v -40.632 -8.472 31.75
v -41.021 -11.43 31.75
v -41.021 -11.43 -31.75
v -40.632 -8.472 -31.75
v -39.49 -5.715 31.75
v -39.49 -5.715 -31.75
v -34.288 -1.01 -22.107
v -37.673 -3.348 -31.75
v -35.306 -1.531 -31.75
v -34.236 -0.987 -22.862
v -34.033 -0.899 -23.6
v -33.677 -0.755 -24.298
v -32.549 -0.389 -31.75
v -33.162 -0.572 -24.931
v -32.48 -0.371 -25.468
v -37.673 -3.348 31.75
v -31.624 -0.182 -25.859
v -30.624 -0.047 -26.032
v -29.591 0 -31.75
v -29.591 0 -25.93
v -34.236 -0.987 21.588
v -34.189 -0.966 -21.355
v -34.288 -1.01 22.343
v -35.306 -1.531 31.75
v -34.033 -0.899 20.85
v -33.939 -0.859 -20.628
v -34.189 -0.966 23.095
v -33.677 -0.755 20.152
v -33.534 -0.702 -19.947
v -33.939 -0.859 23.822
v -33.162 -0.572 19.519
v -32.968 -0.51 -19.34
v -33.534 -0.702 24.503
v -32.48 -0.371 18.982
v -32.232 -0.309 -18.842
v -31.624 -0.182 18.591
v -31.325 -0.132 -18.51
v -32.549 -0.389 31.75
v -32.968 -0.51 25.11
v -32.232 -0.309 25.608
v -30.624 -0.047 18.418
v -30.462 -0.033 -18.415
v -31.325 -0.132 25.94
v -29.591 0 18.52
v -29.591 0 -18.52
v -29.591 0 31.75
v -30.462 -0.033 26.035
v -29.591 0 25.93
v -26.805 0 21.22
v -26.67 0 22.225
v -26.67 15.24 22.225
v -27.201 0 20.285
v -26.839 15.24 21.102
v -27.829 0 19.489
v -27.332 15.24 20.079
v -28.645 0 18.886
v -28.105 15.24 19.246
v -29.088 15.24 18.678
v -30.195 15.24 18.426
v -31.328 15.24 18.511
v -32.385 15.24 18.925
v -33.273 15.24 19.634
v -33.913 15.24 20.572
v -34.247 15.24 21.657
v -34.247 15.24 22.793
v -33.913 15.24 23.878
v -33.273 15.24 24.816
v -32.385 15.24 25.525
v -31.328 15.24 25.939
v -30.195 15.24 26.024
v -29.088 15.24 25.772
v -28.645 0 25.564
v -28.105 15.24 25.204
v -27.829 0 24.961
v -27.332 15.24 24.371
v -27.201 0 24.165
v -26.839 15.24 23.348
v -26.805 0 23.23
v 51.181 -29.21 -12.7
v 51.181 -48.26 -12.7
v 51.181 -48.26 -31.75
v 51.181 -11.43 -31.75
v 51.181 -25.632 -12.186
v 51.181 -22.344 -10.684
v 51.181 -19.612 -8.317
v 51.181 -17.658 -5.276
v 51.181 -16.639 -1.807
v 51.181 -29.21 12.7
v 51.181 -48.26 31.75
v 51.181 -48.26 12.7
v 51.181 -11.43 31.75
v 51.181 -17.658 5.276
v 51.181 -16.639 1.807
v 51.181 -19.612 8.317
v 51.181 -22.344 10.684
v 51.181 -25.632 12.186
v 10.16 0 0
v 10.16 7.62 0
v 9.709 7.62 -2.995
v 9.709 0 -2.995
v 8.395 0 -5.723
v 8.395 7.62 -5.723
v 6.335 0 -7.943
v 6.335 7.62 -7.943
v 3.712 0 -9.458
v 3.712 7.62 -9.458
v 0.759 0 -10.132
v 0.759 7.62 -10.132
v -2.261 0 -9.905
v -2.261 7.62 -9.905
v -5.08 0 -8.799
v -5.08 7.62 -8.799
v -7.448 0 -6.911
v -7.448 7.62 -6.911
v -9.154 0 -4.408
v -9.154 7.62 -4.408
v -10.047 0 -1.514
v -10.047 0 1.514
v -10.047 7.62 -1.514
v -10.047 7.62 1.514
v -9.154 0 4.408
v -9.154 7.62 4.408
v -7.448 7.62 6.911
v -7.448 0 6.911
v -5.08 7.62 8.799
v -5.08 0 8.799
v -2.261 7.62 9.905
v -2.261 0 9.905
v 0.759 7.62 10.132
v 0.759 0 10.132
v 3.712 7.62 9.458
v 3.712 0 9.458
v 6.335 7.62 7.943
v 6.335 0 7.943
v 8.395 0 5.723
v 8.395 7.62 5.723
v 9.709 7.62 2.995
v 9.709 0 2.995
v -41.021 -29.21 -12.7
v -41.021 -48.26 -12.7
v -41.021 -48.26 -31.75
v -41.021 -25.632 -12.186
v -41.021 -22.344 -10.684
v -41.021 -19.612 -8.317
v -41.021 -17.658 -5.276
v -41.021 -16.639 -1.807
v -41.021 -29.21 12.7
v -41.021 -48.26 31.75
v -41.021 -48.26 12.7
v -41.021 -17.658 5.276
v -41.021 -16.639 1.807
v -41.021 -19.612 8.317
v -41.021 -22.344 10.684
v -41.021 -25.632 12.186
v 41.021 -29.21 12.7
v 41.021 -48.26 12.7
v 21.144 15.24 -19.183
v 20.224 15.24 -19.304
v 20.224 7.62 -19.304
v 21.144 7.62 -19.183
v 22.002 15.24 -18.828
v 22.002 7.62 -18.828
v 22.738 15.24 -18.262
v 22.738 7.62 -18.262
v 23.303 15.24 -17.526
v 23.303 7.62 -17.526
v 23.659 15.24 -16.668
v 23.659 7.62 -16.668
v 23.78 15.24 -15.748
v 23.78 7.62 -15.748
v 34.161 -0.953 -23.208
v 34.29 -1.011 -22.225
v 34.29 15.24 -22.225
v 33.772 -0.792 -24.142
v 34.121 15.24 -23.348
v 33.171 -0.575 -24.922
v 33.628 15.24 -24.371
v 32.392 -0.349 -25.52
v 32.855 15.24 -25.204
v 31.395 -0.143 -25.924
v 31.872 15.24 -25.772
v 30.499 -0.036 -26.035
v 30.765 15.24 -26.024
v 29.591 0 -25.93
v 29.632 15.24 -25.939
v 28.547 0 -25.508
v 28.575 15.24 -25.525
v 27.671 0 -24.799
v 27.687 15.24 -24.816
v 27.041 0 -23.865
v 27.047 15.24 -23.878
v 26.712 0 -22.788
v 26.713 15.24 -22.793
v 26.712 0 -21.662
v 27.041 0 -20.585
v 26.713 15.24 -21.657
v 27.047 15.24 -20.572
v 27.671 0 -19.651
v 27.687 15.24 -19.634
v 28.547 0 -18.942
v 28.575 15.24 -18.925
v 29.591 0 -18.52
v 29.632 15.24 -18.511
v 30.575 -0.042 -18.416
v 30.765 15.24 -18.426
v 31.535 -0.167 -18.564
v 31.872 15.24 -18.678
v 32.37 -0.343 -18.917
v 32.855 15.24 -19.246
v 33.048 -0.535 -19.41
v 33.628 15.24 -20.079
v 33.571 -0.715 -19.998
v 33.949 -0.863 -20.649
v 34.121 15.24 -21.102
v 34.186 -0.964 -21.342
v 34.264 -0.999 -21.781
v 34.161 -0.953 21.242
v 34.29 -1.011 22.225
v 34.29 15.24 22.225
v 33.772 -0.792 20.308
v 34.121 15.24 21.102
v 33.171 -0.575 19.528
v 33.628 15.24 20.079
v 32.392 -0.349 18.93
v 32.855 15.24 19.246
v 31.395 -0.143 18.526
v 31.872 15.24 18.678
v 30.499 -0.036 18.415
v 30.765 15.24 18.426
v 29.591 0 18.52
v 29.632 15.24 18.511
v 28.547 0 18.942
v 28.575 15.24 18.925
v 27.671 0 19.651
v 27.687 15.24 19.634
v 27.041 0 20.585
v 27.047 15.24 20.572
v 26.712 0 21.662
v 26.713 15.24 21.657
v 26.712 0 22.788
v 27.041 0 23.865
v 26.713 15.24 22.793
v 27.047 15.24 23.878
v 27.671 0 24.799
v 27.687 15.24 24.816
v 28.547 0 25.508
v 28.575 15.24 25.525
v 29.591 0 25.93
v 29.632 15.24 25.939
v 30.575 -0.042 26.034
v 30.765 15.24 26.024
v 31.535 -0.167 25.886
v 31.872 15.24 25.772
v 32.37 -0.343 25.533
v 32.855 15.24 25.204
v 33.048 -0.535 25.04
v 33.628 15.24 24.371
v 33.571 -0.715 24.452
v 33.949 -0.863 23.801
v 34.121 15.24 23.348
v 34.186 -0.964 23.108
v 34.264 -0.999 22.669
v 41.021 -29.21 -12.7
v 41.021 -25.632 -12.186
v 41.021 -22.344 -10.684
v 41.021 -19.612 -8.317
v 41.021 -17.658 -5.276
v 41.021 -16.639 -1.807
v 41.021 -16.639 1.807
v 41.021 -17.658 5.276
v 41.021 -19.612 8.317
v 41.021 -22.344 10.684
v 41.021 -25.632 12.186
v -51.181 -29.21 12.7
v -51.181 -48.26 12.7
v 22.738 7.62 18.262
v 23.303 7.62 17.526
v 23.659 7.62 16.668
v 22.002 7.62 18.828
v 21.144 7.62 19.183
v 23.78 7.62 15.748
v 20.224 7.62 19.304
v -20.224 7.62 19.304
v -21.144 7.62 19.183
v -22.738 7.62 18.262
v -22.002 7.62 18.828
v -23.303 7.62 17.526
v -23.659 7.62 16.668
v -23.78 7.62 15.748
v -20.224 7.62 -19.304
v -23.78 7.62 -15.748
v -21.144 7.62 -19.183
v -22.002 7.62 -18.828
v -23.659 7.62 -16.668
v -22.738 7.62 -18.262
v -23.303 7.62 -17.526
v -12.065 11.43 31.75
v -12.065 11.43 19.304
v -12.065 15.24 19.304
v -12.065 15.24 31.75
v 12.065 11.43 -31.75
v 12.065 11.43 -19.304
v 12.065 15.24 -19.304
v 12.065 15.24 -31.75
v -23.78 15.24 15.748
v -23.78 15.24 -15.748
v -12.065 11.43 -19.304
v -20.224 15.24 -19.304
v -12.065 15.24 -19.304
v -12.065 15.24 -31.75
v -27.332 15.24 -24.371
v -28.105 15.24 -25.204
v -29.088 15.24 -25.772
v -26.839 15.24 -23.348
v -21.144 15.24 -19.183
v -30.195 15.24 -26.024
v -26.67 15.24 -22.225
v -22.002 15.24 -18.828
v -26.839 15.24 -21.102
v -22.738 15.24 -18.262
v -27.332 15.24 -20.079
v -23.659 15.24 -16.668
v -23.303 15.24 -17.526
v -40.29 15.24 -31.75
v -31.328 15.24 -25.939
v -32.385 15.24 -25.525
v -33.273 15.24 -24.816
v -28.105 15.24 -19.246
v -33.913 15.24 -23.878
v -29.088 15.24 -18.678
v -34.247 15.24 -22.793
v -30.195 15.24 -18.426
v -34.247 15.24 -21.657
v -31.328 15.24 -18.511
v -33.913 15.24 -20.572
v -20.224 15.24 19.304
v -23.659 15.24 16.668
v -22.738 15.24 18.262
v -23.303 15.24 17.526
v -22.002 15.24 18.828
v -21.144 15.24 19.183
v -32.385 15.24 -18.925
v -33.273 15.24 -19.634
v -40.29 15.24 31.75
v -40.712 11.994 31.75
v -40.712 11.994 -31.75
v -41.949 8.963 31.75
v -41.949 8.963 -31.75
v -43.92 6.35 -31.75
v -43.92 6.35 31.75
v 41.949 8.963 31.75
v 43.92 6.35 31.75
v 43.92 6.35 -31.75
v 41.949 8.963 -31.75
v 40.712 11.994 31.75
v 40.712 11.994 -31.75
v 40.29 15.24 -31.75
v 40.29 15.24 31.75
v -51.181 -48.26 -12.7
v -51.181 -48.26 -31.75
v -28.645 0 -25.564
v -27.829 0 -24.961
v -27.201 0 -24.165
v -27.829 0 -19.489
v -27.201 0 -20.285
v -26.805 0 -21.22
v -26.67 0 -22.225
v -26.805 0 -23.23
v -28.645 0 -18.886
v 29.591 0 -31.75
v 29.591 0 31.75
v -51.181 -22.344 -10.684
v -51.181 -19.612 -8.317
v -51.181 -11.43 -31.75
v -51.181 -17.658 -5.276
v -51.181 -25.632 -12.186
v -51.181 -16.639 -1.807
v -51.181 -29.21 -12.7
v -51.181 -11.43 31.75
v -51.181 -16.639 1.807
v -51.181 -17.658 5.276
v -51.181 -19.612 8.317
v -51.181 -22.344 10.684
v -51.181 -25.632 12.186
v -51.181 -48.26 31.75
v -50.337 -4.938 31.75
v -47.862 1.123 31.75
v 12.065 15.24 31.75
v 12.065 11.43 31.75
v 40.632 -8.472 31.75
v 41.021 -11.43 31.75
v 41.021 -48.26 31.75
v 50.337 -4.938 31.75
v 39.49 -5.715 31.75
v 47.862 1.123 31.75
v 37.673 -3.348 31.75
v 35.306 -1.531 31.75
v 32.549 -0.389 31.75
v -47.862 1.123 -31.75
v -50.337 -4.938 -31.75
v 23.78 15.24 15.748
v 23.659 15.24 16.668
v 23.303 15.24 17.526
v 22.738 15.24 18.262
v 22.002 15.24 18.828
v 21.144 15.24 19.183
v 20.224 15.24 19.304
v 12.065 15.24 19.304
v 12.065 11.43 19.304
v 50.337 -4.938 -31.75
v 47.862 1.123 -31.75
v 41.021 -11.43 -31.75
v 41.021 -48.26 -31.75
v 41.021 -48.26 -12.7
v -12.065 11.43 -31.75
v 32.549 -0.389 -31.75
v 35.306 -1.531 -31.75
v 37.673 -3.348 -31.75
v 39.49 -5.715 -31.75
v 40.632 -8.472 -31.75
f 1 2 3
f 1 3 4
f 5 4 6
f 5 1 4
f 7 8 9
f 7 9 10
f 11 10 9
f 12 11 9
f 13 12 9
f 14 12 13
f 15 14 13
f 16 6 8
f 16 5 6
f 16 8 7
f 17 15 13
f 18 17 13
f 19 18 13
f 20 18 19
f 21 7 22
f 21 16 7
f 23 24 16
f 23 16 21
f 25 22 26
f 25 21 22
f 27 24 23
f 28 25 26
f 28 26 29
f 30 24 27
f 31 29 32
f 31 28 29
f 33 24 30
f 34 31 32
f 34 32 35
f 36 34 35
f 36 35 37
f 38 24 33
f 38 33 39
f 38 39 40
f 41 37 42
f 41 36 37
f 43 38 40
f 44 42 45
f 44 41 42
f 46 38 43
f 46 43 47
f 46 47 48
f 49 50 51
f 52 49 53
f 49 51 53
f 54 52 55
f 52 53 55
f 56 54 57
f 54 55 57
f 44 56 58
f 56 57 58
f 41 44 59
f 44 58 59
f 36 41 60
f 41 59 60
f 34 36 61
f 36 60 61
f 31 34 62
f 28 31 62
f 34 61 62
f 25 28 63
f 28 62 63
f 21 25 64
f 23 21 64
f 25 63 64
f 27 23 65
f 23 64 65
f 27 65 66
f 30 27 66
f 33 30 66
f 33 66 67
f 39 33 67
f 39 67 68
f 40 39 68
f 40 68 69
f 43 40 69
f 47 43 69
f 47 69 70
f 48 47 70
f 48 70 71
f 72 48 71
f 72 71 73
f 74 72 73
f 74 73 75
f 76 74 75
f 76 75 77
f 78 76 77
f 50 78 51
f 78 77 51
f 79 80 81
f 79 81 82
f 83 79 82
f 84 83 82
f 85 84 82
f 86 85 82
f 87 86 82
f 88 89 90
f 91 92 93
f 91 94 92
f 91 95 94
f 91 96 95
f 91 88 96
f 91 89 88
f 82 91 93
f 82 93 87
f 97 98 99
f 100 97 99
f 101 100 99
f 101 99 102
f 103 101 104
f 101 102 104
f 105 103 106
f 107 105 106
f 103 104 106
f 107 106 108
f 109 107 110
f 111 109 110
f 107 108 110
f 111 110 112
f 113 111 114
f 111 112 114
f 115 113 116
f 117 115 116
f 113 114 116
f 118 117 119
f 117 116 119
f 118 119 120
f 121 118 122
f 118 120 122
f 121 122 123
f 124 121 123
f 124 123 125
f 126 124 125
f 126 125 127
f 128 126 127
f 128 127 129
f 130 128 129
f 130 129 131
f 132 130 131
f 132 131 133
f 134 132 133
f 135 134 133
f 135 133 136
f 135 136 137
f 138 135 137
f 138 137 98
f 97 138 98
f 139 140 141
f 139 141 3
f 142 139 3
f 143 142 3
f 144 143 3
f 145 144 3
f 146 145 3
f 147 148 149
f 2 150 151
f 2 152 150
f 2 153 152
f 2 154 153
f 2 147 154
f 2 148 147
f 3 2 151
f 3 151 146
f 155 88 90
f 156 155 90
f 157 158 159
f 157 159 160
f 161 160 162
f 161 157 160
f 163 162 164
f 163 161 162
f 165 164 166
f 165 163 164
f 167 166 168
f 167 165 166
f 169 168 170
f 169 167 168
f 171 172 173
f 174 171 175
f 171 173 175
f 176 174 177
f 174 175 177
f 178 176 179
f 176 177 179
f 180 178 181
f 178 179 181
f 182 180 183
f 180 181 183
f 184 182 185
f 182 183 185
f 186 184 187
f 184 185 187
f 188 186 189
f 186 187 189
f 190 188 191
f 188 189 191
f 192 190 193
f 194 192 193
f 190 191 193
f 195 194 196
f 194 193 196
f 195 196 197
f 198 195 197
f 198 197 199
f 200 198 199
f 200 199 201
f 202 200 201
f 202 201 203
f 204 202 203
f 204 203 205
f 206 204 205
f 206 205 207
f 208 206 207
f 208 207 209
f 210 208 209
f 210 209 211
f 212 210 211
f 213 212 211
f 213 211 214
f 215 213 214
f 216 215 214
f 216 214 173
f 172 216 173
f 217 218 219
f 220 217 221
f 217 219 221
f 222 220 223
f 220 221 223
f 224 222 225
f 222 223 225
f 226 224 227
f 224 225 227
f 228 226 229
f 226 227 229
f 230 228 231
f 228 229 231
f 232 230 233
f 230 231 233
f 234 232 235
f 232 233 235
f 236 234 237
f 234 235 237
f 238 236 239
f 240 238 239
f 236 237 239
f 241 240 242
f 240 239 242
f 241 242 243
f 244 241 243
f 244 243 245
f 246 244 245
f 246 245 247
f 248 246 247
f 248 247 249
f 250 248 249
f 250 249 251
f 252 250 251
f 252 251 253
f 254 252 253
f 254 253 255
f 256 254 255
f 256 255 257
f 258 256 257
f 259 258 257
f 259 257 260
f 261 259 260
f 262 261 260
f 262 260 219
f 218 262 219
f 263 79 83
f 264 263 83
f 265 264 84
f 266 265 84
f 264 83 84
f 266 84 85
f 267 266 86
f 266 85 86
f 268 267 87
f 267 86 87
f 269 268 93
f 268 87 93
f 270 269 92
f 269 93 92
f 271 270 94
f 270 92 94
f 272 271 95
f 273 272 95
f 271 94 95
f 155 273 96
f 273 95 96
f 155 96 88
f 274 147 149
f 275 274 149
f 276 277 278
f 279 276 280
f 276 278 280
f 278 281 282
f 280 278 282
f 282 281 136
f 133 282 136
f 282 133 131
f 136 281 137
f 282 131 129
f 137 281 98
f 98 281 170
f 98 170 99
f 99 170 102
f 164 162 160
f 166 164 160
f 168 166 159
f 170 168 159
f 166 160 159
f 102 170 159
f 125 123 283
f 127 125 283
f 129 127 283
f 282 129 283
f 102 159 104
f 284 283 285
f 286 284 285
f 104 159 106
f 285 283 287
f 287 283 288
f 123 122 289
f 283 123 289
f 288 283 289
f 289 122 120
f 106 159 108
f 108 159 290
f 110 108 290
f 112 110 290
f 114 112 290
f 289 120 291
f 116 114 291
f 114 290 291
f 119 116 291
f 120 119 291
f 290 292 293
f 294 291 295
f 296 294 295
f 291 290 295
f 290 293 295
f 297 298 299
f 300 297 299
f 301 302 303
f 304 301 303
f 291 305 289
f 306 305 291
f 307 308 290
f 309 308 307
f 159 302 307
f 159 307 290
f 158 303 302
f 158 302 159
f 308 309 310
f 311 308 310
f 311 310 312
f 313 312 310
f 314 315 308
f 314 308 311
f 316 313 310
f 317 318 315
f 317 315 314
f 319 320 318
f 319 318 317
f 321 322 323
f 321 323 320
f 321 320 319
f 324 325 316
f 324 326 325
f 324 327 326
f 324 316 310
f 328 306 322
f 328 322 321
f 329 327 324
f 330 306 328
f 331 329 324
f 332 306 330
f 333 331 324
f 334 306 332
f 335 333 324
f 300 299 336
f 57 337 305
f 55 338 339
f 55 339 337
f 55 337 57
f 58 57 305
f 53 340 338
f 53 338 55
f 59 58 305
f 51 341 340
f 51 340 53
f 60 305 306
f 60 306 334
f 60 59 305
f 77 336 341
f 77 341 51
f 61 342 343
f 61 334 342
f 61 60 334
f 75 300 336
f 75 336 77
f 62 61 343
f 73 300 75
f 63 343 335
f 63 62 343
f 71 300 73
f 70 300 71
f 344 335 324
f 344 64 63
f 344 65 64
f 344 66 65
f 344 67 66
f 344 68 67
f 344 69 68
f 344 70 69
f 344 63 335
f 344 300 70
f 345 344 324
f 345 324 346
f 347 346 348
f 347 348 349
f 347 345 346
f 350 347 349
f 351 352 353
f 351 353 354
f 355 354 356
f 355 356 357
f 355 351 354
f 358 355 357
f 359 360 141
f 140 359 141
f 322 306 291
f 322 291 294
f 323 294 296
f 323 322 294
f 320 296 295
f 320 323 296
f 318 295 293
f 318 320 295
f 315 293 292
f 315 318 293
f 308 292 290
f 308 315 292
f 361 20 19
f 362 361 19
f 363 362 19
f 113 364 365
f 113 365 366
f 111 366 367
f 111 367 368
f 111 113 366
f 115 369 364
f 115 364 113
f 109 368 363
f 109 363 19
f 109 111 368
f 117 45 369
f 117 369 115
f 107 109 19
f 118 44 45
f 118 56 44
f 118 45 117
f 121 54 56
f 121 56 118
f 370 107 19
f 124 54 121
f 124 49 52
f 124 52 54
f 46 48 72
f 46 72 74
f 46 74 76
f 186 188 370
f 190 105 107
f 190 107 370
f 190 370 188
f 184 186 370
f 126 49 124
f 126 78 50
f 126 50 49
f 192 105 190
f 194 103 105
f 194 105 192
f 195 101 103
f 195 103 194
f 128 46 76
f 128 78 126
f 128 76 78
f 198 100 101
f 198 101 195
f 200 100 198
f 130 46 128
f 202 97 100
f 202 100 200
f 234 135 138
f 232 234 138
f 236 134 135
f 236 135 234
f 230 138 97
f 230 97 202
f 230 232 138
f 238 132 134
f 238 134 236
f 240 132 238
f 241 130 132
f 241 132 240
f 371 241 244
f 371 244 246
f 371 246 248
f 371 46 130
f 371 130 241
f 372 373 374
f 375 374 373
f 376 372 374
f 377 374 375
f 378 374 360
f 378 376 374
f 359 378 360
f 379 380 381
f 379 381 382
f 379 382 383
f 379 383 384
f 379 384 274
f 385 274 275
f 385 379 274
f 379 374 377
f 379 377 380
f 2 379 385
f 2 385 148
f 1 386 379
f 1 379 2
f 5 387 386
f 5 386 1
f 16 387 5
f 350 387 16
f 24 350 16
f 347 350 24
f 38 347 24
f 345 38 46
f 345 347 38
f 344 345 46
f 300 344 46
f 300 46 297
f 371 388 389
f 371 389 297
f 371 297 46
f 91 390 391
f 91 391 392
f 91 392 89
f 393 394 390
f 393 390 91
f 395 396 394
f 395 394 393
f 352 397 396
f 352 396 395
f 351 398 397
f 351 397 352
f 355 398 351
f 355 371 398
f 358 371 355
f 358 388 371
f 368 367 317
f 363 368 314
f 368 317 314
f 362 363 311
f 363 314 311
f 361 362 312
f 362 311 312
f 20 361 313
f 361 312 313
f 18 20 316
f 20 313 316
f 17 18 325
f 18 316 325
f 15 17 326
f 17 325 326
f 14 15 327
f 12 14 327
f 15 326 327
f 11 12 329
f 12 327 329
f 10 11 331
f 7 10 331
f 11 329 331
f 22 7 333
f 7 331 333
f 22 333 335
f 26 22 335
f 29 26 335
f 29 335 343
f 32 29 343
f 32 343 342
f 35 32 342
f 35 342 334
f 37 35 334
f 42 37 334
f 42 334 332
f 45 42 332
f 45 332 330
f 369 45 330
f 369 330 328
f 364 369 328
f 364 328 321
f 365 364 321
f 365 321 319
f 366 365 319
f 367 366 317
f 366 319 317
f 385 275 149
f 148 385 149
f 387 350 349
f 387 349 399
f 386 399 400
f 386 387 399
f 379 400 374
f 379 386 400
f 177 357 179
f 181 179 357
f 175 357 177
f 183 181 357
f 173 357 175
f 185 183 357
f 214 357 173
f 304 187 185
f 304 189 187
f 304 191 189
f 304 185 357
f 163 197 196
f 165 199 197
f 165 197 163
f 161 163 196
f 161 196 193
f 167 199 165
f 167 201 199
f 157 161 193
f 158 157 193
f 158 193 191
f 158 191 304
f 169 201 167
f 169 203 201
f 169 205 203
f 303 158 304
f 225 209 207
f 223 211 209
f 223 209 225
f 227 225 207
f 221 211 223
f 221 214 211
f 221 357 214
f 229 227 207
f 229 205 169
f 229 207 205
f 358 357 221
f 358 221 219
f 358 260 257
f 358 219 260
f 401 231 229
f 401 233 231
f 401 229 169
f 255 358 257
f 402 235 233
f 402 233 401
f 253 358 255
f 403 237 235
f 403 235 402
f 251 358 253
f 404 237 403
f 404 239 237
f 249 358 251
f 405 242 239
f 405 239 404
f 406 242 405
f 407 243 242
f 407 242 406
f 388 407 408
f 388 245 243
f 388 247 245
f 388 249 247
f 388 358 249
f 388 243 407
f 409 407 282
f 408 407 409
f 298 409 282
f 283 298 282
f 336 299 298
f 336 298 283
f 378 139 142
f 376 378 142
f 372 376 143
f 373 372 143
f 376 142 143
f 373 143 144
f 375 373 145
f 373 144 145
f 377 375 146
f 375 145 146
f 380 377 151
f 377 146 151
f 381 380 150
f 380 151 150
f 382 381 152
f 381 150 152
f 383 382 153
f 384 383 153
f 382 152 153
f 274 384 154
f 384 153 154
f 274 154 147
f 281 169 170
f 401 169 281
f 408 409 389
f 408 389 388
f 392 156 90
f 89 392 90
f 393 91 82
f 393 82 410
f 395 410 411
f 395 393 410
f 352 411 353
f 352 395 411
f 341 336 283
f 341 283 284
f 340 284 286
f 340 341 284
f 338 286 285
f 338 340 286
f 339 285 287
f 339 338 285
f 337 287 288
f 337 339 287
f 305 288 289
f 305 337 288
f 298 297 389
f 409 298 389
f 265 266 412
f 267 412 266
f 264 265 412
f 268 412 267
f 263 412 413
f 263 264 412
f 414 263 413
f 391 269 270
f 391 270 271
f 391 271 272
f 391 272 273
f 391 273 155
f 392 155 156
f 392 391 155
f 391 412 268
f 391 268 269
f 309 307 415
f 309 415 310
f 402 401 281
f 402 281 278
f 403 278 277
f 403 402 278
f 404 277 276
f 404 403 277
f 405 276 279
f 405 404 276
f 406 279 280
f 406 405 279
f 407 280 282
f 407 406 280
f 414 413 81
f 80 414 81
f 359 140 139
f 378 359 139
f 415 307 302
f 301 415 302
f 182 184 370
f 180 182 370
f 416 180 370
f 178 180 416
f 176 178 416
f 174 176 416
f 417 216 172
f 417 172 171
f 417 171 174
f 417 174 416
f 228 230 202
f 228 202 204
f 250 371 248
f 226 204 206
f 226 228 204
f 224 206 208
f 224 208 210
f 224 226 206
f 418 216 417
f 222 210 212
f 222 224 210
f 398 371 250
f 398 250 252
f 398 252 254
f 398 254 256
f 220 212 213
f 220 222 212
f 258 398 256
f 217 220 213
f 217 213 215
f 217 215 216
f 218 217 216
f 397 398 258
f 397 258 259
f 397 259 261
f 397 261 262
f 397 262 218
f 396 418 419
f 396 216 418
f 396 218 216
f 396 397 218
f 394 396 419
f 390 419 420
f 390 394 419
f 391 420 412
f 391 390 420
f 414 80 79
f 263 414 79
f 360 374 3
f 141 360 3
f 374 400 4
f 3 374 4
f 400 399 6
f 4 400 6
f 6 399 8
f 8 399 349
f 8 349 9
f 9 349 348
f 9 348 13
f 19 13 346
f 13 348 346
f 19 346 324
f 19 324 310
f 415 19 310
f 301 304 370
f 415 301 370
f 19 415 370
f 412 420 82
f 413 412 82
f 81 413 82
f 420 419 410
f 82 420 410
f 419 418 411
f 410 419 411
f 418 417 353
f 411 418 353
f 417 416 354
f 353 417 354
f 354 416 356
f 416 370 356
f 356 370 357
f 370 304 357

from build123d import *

# Parameters (mm, degrees)
BOSS_EXTRUDE1_DEPTH = 31.75
CUT_EXTRUDE1_DEPTH  = 103.362
CUT_EXTRUDE2_DEPTH  = 7.62
SKETCH5_W           = 24.13
SKETCH5_H           = 3.81
CUT_EXTRUDE3_DEPTH  = 64.5
CUT_EXTRUDE4_REACH  = 57.88
SKETCH6_R           = 10.16
CUT_EXTRUDE5_REACH  = 65.5
SKETCH7_R           = 3.81


with BuildPart() as part:
    # Sketch2 → Boss-Extrude1 (new body, symmetric)
    with BuildSketch(Plane.XY):
        with BuildLine():
            Line((-29.591, 0), (29.591, 0))
            ThreePointArc((29.591, 0), (37.673230509, -3.347769491), (41.021, -11.43))
            Line((41.021, -11.43), (41.021, -48.26))
            Line((41.021, -48.26), (51.181, -48.26))
            Line((51.181, -48.26), (51.181, -11.43))
            ThreePointArc((51.181, -11.43), (49.29585059, -1.827302371), (43.920228208, 6.35))
            ThreePointArc((43.920228208, 6.35), (41.232417018, 10.438651186), (40.289842313, 15.24))
            Line((40.289842313, 15.24), (-40.289842313, 15.24))
            ThreePointArc((-40.289842313, 15.24), (-41.232417018, 10.438651186), (-43.920228208, 6.35))
            ThreePointArc((-43.920228208, 6.35), (-49.29585059, -1.827302371), (-51.181, -11.43))
            Line((-51.181, -11.43), (-51.181, -48.26))
            Line((-51.181, -48.26), (-41.021, -48.26))
            Line((-41.021, -48.26), (-41.021, -11.43))
            ThreePointArc((-41.021, -11.43), (-37.673230509, -3.347769491), (-29.591, 0))
        make_face()
    extrude(amount=BOSS_EXTRUDE1_DEPTH, both=True)

    # Sketch3 → Cut-Extrude1 (cut, through all)
    with BuildSketch(Plane(origin=(51.181, 0, 0), x_dir=(0, 0, -1), z_dir=(1, 0, 0))):
        with BuildLine():
            Line((-12.7, -48.26), (12.7, -48.26))
            Line((12.7, -48.26), (12.7, -29.21))
            ThreePointArc((12.7, -29.21), (0, -16.51), (-12.7, -29.21))
            Line((-12.7, -29.21), (-12.7, -48.26))
        make_face()
    extrude(amount=-CUT_EXTRUDE1_DEPTH, mode=Mode.SUBTRACT)

    # Sketch4 → Cut-Extrude2 (cut)
    with BuildSketch(Plane(origin=(0, 15.24, 0), x_dir=(1, 0, 0), z_dir=(0, 1, 0))):
        with BuildLine():
            Line((-20.223842313, 19.304), (20.223842313, 19.304))
            ThreePointArc((20.223842313, 19.304), (22.738314027, 18.262471714), (23.779842313, 15.748))
            Line((23.779842313, 15.748), (23.779842313, -15.748))
            ThreePointArc((23.779842313, -15.748), (22.738314027, -18.262471714), (20.223842313, -19.304))
            Line((20.223842313, -19.304), (-20.223842313, -19.304))
            ThreePointArc((-20.223842313, -19.304), (-22.738314027, -18.262471714), (-23.779842313, -15.748))
            Line((-23.779842313, -15.748), (-23.779842313, 15.748))
            ThreePointArc((-23.779842313, 15.748), (-22.738314027, 18.262471714), (-20.223842313, 19.304))
        make_face()
    extrude(amount=-CUT_EXTRUDE2_DEPTH, mode=Mode.SUBTRACT)

    # Sketch5 → Cut-Extrude3 (cut, through all)
    with BuildSketch(Plane.XY.offset(31.75)):
        with Locations((0, 13.335)):
            Rectangle(SKETCH5_W, SKETCH5_H)
    extrude(amount=-CUT_EXTRUDE3_DEPTH, mode=Mode.SUBTRACT)

    # Sketch6 → Cut-Extrude4 (cut, up to next)
    with BuildSketch(Plane(origin=(0, 7.62, 0), x_dir=(1, 0, 0), z_dir=(0, 1, 0)), mode=Mode.PRIVATE) as cut_extrude4_sk1:
        Circle(SKETCH6_R)
    cut_extrude4_tool1 = extrude(cut_extrude4_sk1.sketch, amount=-CUT_EXTRUDE4_REACH, mode=Mode.PRIVATE) & part.part
    add(cut_extrude4_tool1.solids().sort_by_distance((0, 7.62, 0))[0], mode=Mode.SUBTRACT)

    # Sketch7 → Cut-Extrude5 (cut, up to next)
    with BuildSketch(Plane(origin=(0, 15.24, 0), x_dir=(1, 0, 0), z_dir=(0, 1, 0)), mode=Mode.PRIVATE) as cut_extrude5_sk1:
        with Locations((-30.48, 22.225)):
            Circle(SKETCH7_R)
    cut_extrude5_tool1 = extrude(cut_extrude5_sk1.sketch, amount=-CUT_EXTRUDE5_REACH, mode=Mode.PRIVATE) & part.part
    add(cut_extrude5_tool1.solids().sort_by_distance((-30.48, 15.24, -22.225))[0], mode=Mode.SUBTRACT)
    # Sketch7 → Cut-Extrude5 (cut, up to next)
    with BuildSketch(Plane(origin=(0, 15.24, 0), x_dir=(1, 0, 0), z_dir=(0, 1, 0)), mode=Mode.PRIVATE) as cut_extrude5_sk2:
        with Locations((30.48, 22.225)):
            Circle(SKETCH7_R)
    cut_extrude5_tool2 = extrude(cut_extrude5_sk2.sketch, amount=-CUT_EXTRUDE5_REACH, mode=Mode.PRIVATE) & part.part
    add(cut_extrude5_tool2.solids().sort_by_distance((30.48, 15.24, -22.225))[0], mode=Mode.SUBTRACT)
    # Sketch7 → Cut-Extrude5 (cut, up to next)
    with BuildSketch(Plane(origin=(0, 15.24, 0), x_dir=(1, 0, 0), z_dir=(0, 1, 0)), mode=Mode.PRIVATE) as cut_extrude5_sk3:
        with Locations((30.48, -22.225)):
            Circle(SKETCH7_R)
    cut_extrude5_tool3 = extrude(cut_extrude5_sk3.sketch, amount=-CUT_EXTRUDE5_REACH, mode=Mode.PRIVATE) & part.part
    add(cut_extrude5_tool3.solids().sort_by_distance((30.48, 15.24, 22.225))[0], mode=Mode.SUBTRACT)
    # Sketch7 → Cut-Extrude5 (cut, up to next)
    with BuildSketch(Plane(origin=(0, 15.24, 0), x_dir=(1, 0, 0), z_dir=(0, 1, 0)), mode=Mode.PRIVATE) as cut_extrude5_sk4:
        with Locations((-30.48, -22.225)):
            Circle(SKETCH7_R)
    cut_extrude5_tool4 = extrude(cut_extrude5_sk4.sketch, amount=-CUT_EXTRUDE5_REACH, mode=Mode.PRIVATE) & part.part
    add(cut_extrude5_tool4.solids().sort_by_distance((-30.48, 15.24, 22.225))[0], mode=Mode.SUBTRACT)


solid = part.part
